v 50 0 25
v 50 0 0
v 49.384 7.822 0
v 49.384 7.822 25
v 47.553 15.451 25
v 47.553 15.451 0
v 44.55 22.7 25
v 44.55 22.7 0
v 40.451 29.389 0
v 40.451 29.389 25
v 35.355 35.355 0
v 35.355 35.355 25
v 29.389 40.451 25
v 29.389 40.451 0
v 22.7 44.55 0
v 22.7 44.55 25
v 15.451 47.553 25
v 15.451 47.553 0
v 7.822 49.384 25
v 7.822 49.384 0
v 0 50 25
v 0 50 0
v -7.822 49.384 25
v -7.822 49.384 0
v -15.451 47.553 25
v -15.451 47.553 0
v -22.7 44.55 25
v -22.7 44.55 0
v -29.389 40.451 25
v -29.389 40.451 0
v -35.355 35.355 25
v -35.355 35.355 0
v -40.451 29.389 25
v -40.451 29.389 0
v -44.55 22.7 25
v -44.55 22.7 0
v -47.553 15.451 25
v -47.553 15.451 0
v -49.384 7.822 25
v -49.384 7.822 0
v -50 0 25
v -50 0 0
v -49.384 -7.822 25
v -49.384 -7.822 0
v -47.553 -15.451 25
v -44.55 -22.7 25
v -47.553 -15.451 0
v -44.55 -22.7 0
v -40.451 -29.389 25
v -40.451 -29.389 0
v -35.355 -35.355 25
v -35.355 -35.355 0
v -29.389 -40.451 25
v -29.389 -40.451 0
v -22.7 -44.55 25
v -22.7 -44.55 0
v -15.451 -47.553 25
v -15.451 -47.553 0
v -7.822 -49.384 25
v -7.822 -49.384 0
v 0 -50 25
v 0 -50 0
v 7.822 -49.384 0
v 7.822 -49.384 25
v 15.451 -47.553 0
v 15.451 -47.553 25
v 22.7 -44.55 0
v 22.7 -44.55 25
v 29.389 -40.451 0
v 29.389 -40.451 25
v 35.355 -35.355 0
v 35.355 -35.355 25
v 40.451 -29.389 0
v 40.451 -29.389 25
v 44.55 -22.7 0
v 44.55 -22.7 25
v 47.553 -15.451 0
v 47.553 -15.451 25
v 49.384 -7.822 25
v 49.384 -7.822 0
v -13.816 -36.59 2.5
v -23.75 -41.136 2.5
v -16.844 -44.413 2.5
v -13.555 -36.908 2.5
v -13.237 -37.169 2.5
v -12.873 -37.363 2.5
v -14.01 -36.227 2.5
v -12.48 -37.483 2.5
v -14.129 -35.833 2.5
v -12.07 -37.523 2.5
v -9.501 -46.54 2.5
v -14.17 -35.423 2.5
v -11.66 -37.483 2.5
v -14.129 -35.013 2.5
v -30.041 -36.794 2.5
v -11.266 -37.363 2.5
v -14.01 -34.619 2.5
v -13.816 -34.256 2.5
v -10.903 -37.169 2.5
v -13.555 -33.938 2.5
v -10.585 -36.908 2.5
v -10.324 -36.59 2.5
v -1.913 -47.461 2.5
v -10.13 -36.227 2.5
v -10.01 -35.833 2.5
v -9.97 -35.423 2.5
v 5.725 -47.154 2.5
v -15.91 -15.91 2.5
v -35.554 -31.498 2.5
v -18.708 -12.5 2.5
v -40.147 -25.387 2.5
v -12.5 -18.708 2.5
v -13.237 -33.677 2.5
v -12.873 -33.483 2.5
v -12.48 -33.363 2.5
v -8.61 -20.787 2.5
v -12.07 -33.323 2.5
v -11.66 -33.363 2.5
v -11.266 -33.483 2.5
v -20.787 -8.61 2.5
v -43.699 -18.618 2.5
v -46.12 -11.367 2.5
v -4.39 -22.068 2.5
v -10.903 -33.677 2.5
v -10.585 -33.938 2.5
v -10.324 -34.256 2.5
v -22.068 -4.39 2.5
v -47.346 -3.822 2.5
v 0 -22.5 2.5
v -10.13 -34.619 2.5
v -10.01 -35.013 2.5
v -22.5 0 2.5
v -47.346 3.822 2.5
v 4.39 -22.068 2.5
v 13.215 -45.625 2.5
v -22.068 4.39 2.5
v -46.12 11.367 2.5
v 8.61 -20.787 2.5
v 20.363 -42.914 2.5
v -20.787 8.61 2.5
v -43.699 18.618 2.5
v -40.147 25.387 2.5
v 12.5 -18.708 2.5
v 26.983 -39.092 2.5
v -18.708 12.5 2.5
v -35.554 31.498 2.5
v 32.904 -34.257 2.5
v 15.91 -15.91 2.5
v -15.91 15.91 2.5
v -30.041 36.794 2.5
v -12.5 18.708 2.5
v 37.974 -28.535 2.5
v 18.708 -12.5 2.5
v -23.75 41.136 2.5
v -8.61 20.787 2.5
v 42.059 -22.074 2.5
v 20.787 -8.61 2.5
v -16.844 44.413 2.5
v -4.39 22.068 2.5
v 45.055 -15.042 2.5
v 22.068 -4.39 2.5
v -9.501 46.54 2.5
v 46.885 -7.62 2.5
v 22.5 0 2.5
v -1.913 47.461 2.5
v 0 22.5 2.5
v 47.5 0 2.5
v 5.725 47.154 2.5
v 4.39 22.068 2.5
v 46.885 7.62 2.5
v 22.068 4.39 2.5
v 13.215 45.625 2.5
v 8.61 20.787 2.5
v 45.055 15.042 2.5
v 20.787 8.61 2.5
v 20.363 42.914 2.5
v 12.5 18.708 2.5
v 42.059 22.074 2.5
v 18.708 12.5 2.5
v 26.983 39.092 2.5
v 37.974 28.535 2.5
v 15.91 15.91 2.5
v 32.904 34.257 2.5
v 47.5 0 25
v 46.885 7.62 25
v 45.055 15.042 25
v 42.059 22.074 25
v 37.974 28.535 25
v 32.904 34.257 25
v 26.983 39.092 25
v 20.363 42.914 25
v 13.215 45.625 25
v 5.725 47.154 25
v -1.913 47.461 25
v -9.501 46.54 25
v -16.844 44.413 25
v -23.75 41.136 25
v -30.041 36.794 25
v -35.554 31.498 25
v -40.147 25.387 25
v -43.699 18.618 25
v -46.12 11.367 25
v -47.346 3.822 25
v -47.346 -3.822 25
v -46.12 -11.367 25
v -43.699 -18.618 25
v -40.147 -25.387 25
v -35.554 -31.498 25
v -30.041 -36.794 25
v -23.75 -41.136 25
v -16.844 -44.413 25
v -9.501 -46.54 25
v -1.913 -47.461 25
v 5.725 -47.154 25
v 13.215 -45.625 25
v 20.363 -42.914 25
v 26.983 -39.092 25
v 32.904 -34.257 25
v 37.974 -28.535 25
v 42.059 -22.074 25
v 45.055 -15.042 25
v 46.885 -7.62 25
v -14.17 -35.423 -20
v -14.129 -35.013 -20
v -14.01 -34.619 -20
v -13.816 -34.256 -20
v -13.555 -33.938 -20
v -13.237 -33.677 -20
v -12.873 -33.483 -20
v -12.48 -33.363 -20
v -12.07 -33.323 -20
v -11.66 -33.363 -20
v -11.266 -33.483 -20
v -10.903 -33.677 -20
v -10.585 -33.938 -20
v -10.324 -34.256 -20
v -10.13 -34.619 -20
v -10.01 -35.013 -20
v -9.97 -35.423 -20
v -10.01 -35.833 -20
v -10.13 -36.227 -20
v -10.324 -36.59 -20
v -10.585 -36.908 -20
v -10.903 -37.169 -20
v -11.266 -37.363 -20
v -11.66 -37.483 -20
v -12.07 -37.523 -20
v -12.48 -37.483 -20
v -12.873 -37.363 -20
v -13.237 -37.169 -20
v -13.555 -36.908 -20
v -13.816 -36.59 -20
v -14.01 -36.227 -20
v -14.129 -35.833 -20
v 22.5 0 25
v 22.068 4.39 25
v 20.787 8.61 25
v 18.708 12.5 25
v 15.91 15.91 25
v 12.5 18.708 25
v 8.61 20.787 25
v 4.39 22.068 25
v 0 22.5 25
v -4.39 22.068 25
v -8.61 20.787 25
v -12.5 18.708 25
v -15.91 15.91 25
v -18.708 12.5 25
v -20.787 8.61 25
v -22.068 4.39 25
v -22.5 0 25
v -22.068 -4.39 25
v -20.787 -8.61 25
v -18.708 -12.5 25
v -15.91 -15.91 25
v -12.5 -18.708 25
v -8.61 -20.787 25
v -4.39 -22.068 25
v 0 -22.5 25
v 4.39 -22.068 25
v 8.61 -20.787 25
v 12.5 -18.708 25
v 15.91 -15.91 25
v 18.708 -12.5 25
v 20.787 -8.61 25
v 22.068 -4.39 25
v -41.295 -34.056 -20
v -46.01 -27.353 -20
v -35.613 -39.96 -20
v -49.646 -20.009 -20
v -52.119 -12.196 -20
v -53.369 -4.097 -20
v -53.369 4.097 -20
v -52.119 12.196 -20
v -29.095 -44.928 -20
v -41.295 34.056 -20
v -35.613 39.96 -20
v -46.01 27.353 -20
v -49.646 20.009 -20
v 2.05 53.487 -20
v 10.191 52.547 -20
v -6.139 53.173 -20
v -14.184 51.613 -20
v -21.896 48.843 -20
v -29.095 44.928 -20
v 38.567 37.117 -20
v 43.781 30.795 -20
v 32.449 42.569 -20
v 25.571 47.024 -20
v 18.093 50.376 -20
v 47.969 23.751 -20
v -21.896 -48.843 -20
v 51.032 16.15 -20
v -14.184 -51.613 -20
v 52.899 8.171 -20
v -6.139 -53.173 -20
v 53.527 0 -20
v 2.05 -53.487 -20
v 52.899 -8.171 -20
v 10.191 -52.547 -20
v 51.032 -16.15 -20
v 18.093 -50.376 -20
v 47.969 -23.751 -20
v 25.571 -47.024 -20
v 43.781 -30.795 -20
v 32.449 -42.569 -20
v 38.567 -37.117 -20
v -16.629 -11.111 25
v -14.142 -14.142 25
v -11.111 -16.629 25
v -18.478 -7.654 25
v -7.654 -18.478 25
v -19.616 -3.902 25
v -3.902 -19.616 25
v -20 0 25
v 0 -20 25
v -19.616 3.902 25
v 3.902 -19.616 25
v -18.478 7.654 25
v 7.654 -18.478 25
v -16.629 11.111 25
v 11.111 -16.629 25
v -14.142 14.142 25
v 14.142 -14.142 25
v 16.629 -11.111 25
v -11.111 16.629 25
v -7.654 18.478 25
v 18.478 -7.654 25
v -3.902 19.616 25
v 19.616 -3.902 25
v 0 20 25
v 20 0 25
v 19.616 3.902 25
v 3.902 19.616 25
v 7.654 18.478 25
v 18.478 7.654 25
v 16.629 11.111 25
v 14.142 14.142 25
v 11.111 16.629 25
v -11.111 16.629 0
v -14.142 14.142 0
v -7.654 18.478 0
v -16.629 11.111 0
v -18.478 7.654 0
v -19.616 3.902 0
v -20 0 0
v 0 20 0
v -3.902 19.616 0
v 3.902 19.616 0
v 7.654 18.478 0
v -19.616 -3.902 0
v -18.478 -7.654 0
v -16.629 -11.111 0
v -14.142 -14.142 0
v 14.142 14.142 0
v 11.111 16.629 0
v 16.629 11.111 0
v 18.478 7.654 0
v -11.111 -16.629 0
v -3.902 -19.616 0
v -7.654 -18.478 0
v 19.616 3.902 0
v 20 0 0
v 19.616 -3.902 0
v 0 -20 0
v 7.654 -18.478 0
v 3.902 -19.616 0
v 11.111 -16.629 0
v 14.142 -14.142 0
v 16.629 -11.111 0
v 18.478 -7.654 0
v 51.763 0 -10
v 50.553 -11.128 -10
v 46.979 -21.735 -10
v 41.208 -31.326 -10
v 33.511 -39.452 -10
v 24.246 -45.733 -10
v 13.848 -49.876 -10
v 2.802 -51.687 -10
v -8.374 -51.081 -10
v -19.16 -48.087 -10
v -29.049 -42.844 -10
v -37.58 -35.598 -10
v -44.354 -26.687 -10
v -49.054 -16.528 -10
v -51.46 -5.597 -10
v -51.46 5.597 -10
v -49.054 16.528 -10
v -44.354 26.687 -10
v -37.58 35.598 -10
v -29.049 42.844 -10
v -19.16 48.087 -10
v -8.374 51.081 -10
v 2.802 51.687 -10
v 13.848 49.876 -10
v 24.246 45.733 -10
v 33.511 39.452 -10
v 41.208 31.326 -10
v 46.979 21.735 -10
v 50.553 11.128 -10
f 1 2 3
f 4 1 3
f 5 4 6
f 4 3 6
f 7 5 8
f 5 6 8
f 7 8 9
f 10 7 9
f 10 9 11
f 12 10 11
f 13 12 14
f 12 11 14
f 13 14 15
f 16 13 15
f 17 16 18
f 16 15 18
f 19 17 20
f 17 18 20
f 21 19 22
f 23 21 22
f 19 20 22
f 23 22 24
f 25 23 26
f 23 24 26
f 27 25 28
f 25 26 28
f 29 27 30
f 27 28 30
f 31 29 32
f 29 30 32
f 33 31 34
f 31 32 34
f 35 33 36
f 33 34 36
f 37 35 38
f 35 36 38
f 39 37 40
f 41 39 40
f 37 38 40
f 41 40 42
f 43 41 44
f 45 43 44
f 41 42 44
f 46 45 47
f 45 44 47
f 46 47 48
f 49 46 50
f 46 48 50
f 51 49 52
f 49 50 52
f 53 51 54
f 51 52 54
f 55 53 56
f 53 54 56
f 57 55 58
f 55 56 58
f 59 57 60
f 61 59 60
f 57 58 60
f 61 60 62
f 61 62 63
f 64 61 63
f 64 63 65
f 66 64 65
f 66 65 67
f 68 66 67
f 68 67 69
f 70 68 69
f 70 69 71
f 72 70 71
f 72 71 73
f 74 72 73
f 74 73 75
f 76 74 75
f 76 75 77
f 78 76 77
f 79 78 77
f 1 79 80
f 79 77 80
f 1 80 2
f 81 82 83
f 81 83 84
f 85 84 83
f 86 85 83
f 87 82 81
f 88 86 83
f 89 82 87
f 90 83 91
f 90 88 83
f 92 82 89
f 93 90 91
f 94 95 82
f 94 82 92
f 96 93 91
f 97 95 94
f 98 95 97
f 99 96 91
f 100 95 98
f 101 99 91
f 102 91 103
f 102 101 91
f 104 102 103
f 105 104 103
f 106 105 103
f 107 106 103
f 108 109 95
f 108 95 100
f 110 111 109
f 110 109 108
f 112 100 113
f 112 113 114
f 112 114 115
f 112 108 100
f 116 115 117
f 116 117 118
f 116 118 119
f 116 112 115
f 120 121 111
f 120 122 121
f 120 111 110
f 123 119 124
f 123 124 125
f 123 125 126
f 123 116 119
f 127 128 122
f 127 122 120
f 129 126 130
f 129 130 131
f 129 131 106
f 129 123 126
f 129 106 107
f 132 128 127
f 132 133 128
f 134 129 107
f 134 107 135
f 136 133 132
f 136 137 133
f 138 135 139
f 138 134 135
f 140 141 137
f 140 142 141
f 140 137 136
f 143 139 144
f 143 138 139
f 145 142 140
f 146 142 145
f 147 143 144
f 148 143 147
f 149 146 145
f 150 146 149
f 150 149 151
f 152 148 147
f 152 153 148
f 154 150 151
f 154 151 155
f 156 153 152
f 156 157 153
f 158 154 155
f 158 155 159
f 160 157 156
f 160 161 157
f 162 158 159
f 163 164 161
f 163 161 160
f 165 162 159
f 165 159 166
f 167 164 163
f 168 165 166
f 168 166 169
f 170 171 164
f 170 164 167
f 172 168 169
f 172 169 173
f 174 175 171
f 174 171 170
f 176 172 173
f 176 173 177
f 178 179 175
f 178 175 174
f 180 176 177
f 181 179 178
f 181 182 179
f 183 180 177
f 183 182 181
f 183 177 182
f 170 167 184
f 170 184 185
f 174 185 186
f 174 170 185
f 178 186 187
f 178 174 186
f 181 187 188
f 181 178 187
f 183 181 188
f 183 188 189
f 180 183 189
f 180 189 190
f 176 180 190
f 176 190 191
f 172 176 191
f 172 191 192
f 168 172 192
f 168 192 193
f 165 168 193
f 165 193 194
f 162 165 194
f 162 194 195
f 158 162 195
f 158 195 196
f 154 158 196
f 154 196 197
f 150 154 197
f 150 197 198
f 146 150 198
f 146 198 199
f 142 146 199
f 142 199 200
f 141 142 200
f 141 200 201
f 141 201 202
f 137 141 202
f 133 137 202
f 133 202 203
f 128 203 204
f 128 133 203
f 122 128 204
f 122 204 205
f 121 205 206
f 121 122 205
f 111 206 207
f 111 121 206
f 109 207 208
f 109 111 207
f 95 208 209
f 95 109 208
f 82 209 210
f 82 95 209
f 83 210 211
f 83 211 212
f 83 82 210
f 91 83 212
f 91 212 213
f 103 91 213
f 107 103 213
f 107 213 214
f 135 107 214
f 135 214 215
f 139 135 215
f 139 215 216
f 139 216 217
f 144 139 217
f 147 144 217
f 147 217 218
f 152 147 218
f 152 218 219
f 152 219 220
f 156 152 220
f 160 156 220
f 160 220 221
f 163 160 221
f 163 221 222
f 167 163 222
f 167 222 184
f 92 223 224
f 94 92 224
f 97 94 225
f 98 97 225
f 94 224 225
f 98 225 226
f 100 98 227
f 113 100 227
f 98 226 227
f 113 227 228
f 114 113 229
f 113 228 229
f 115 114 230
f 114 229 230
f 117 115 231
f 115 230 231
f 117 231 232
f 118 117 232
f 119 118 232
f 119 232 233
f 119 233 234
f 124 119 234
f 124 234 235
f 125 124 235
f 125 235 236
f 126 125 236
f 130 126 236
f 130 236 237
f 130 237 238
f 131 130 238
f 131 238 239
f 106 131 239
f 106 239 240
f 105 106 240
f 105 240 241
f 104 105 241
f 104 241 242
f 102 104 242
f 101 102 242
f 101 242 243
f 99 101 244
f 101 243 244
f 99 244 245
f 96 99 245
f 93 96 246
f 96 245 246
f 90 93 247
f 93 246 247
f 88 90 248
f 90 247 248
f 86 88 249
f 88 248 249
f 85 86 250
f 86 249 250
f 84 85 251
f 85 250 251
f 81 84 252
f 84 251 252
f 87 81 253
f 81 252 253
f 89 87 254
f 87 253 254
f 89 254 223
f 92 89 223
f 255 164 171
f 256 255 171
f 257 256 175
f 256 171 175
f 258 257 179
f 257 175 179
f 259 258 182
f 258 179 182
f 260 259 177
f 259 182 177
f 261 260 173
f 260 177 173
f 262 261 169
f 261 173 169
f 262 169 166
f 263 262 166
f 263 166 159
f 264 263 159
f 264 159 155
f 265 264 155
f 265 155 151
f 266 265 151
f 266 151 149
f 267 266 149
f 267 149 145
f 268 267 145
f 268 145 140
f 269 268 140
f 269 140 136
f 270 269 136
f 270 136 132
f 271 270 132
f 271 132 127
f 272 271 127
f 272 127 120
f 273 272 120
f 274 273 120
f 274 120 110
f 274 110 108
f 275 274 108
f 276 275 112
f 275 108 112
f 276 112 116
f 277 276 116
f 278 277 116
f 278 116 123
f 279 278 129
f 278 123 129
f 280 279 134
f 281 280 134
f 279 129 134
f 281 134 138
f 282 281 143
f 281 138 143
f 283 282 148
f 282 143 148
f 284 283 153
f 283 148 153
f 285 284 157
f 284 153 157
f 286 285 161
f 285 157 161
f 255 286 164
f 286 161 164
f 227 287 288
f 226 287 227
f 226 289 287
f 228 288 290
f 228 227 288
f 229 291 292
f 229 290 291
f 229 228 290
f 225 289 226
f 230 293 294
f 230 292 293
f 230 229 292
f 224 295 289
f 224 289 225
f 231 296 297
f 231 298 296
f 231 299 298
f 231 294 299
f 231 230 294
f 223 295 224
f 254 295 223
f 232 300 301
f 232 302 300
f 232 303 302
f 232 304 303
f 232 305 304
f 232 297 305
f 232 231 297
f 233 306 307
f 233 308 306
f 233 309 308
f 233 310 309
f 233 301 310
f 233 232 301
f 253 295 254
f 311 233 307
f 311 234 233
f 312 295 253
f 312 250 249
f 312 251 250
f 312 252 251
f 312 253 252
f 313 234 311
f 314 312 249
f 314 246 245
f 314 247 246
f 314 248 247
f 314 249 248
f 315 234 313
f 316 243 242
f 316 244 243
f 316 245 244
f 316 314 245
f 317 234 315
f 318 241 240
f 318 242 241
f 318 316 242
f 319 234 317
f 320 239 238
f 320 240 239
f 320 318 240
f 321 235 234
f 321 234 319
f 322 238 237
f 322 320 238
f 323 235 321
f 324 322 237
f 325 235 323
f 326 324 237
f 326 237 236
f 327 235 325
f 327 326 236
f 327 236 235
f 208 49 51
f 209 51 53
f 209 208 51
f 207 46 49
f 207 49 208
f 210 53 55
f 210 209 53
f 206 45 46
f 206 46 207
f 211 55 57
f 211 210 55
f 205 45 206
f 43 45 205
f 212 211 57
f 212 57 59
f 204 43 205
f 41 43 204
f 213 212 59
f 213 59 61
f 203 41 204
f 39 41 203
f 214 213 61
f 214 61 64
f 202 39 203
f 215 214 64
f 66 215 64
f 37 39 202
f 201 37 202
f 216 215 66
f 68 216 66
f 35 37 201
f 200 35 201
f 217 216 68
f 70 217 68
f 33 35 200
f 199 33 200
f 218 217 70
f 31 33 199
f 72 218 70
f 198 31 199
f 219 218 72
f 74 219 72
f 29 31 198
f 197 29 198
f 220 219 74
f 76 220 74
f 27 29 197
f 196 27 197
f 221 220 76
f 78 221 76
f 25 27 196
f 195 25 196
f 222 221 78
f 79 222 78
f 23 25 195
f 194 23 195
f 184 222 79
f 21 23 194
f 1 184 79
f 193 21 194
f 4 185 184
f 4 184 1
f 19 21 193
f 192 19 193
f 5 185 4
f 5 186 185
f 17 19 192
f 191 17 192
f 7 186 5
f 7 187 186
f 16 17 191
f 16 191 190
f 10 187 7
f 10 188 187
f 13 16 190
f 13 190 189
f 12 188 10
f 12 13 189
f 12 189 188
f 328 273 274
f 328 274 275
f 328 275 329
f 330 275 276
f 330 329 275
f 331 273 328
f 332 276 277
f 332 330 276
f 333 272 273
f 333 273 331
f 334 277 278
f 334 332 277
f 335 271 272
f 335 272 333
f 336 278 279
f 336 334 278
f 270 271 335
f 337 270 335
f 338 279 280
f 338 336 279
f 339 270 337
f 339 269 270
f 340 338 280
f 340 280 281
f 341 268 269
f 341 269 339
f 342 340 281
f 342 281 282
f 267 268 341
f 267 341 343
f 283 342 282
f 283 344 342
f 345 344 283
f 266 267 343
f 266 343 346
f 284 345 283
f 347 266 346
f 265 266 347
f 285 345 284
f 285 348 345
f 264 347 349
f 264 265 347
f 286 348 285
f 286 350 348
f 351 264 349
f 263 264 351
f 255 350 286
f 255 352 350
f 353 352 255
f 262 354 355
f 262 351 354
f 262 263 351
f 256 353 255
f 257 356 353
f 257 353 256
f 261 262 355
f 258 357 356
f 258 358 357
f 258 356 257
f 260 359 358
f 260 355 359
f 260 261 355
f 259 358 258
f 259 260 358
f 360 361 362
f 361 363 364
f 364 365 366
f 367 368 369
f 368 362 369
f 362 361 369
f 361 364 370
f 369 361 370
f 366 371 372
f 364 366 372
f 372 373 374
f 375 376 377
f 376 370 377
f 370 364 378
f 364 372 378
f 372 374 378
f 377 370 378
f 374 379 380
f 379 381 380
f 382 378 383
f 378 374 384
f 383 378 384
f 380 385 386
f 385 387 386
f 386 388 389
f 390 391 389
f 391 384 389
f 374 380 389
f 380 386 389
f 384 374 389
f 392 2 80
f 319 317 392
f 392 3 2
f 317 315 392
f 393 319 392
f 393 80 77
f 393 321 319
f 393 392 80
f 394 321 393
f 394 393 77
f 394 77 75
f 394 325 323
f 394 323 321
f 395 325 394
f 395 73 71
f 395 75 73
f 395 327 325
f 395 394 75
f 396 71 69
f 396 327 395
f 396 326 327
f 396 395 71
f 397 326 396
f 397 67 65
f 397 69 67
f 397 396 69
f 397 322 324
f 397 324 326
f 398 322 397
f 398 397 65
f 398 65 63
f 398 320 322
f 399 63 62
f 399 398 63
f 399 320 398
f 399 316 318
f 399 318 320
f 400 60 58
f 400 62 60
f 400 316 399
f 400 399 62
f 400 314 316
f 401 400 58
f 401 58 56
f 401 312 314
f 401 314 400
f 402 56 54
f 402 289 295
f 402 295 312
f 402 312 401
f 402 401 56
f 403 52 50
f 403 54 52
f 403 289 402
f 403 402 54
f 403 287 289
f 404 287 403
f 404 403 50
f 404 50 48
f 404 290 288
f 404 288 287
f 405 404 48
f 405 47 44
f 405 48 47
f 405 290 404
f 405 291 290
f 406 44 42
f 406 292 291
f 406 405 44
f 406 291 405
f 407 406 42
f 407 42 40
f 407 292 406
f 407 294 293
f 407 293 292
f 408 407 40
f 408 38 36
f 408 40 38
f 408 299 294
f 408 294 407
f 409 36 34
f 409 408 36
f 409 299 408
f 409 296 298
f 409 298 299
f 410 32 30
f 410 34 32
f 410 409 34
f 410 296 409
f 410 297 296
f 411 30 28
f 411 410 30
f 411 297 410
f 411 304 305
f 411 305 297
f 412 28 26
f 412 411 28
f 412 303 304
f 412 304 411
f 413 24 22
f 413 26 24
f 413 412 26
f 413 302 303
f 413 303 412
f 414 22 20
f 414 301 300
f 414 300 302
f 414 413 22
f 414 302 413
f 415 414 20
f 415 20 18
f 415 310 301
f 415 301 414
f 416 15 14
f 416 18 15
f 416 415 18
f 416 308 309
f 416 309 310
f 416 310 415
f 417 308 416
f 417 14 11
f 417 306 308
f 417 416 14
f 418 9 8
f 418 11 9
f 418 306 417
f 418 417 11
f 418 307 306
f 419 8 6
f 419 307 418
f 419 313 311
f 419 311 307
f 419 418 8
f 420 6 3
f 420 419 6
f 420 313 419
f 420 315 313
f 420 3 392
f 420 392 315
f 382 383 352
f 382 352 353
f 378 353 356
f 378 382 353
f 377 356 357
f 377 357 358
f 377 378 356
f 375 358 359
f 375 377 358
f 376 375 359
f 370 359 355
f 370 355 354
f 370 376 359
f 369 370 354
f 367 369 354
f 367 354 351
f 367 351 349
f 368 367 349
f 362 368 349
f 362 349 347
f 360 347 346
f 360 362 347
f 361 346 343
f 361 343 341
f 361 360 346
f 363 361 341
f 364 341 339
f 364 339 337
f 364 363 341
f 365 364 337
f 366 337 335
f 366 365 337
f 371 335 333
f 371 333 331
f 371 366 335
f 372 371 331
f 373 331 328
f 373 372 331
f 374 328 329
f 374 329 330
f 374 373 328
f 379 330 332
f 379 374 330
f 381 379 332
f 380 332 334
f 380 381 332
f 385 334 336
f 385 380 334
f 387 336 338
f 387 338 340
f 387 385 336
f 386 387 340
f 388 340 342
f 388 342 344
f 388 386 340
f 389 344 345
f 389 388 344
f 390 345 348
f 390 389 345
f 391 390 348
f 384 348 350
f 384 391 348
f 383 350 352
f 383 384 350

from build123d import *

# Parameters (mm, degrees)
F0_R     = 50
F0_R_2   = 20
F1_DEPTH = 25
F3_T     = -2.5
F4_R     = 50
F5_DEPTH = 20
F5_TAPER = -10
F6_D     = 4.2


with BuildPart() as f1:
    # F0 (on Top) → F1 (new body)
    with BuildSketch(Plane.XY):
        Circle(F0_R)
        Circle(F0_R_2, mode=Mode.SUBTRACT)
    extrude(amount=F1_DEPTH)

    # F3
    f3_openings = [f1.faces().sort_by_distance(p)[0] for p in [
        (-48.585786, 0, 25),
    ]]
    offset(amount=F3_T, openings=f3_openings)

    # F4 (on face) → F5 (join)
    with BuildSketch(Plane(origin=(0, 0, 0), x_dir=(1, 0, 0), z_dir=(0, 0, -1))):
        Circle(F4_R)
    extrude(amount=F5_DEPTH, taper=F5_TAPER)

    # F6 (through all)
    with Locations(Plane.XY.offset(25)):
        with Locations((-12.0698269457, -35.4231074452)):
            Hole(F6_D / 2)


solid = f1.part
